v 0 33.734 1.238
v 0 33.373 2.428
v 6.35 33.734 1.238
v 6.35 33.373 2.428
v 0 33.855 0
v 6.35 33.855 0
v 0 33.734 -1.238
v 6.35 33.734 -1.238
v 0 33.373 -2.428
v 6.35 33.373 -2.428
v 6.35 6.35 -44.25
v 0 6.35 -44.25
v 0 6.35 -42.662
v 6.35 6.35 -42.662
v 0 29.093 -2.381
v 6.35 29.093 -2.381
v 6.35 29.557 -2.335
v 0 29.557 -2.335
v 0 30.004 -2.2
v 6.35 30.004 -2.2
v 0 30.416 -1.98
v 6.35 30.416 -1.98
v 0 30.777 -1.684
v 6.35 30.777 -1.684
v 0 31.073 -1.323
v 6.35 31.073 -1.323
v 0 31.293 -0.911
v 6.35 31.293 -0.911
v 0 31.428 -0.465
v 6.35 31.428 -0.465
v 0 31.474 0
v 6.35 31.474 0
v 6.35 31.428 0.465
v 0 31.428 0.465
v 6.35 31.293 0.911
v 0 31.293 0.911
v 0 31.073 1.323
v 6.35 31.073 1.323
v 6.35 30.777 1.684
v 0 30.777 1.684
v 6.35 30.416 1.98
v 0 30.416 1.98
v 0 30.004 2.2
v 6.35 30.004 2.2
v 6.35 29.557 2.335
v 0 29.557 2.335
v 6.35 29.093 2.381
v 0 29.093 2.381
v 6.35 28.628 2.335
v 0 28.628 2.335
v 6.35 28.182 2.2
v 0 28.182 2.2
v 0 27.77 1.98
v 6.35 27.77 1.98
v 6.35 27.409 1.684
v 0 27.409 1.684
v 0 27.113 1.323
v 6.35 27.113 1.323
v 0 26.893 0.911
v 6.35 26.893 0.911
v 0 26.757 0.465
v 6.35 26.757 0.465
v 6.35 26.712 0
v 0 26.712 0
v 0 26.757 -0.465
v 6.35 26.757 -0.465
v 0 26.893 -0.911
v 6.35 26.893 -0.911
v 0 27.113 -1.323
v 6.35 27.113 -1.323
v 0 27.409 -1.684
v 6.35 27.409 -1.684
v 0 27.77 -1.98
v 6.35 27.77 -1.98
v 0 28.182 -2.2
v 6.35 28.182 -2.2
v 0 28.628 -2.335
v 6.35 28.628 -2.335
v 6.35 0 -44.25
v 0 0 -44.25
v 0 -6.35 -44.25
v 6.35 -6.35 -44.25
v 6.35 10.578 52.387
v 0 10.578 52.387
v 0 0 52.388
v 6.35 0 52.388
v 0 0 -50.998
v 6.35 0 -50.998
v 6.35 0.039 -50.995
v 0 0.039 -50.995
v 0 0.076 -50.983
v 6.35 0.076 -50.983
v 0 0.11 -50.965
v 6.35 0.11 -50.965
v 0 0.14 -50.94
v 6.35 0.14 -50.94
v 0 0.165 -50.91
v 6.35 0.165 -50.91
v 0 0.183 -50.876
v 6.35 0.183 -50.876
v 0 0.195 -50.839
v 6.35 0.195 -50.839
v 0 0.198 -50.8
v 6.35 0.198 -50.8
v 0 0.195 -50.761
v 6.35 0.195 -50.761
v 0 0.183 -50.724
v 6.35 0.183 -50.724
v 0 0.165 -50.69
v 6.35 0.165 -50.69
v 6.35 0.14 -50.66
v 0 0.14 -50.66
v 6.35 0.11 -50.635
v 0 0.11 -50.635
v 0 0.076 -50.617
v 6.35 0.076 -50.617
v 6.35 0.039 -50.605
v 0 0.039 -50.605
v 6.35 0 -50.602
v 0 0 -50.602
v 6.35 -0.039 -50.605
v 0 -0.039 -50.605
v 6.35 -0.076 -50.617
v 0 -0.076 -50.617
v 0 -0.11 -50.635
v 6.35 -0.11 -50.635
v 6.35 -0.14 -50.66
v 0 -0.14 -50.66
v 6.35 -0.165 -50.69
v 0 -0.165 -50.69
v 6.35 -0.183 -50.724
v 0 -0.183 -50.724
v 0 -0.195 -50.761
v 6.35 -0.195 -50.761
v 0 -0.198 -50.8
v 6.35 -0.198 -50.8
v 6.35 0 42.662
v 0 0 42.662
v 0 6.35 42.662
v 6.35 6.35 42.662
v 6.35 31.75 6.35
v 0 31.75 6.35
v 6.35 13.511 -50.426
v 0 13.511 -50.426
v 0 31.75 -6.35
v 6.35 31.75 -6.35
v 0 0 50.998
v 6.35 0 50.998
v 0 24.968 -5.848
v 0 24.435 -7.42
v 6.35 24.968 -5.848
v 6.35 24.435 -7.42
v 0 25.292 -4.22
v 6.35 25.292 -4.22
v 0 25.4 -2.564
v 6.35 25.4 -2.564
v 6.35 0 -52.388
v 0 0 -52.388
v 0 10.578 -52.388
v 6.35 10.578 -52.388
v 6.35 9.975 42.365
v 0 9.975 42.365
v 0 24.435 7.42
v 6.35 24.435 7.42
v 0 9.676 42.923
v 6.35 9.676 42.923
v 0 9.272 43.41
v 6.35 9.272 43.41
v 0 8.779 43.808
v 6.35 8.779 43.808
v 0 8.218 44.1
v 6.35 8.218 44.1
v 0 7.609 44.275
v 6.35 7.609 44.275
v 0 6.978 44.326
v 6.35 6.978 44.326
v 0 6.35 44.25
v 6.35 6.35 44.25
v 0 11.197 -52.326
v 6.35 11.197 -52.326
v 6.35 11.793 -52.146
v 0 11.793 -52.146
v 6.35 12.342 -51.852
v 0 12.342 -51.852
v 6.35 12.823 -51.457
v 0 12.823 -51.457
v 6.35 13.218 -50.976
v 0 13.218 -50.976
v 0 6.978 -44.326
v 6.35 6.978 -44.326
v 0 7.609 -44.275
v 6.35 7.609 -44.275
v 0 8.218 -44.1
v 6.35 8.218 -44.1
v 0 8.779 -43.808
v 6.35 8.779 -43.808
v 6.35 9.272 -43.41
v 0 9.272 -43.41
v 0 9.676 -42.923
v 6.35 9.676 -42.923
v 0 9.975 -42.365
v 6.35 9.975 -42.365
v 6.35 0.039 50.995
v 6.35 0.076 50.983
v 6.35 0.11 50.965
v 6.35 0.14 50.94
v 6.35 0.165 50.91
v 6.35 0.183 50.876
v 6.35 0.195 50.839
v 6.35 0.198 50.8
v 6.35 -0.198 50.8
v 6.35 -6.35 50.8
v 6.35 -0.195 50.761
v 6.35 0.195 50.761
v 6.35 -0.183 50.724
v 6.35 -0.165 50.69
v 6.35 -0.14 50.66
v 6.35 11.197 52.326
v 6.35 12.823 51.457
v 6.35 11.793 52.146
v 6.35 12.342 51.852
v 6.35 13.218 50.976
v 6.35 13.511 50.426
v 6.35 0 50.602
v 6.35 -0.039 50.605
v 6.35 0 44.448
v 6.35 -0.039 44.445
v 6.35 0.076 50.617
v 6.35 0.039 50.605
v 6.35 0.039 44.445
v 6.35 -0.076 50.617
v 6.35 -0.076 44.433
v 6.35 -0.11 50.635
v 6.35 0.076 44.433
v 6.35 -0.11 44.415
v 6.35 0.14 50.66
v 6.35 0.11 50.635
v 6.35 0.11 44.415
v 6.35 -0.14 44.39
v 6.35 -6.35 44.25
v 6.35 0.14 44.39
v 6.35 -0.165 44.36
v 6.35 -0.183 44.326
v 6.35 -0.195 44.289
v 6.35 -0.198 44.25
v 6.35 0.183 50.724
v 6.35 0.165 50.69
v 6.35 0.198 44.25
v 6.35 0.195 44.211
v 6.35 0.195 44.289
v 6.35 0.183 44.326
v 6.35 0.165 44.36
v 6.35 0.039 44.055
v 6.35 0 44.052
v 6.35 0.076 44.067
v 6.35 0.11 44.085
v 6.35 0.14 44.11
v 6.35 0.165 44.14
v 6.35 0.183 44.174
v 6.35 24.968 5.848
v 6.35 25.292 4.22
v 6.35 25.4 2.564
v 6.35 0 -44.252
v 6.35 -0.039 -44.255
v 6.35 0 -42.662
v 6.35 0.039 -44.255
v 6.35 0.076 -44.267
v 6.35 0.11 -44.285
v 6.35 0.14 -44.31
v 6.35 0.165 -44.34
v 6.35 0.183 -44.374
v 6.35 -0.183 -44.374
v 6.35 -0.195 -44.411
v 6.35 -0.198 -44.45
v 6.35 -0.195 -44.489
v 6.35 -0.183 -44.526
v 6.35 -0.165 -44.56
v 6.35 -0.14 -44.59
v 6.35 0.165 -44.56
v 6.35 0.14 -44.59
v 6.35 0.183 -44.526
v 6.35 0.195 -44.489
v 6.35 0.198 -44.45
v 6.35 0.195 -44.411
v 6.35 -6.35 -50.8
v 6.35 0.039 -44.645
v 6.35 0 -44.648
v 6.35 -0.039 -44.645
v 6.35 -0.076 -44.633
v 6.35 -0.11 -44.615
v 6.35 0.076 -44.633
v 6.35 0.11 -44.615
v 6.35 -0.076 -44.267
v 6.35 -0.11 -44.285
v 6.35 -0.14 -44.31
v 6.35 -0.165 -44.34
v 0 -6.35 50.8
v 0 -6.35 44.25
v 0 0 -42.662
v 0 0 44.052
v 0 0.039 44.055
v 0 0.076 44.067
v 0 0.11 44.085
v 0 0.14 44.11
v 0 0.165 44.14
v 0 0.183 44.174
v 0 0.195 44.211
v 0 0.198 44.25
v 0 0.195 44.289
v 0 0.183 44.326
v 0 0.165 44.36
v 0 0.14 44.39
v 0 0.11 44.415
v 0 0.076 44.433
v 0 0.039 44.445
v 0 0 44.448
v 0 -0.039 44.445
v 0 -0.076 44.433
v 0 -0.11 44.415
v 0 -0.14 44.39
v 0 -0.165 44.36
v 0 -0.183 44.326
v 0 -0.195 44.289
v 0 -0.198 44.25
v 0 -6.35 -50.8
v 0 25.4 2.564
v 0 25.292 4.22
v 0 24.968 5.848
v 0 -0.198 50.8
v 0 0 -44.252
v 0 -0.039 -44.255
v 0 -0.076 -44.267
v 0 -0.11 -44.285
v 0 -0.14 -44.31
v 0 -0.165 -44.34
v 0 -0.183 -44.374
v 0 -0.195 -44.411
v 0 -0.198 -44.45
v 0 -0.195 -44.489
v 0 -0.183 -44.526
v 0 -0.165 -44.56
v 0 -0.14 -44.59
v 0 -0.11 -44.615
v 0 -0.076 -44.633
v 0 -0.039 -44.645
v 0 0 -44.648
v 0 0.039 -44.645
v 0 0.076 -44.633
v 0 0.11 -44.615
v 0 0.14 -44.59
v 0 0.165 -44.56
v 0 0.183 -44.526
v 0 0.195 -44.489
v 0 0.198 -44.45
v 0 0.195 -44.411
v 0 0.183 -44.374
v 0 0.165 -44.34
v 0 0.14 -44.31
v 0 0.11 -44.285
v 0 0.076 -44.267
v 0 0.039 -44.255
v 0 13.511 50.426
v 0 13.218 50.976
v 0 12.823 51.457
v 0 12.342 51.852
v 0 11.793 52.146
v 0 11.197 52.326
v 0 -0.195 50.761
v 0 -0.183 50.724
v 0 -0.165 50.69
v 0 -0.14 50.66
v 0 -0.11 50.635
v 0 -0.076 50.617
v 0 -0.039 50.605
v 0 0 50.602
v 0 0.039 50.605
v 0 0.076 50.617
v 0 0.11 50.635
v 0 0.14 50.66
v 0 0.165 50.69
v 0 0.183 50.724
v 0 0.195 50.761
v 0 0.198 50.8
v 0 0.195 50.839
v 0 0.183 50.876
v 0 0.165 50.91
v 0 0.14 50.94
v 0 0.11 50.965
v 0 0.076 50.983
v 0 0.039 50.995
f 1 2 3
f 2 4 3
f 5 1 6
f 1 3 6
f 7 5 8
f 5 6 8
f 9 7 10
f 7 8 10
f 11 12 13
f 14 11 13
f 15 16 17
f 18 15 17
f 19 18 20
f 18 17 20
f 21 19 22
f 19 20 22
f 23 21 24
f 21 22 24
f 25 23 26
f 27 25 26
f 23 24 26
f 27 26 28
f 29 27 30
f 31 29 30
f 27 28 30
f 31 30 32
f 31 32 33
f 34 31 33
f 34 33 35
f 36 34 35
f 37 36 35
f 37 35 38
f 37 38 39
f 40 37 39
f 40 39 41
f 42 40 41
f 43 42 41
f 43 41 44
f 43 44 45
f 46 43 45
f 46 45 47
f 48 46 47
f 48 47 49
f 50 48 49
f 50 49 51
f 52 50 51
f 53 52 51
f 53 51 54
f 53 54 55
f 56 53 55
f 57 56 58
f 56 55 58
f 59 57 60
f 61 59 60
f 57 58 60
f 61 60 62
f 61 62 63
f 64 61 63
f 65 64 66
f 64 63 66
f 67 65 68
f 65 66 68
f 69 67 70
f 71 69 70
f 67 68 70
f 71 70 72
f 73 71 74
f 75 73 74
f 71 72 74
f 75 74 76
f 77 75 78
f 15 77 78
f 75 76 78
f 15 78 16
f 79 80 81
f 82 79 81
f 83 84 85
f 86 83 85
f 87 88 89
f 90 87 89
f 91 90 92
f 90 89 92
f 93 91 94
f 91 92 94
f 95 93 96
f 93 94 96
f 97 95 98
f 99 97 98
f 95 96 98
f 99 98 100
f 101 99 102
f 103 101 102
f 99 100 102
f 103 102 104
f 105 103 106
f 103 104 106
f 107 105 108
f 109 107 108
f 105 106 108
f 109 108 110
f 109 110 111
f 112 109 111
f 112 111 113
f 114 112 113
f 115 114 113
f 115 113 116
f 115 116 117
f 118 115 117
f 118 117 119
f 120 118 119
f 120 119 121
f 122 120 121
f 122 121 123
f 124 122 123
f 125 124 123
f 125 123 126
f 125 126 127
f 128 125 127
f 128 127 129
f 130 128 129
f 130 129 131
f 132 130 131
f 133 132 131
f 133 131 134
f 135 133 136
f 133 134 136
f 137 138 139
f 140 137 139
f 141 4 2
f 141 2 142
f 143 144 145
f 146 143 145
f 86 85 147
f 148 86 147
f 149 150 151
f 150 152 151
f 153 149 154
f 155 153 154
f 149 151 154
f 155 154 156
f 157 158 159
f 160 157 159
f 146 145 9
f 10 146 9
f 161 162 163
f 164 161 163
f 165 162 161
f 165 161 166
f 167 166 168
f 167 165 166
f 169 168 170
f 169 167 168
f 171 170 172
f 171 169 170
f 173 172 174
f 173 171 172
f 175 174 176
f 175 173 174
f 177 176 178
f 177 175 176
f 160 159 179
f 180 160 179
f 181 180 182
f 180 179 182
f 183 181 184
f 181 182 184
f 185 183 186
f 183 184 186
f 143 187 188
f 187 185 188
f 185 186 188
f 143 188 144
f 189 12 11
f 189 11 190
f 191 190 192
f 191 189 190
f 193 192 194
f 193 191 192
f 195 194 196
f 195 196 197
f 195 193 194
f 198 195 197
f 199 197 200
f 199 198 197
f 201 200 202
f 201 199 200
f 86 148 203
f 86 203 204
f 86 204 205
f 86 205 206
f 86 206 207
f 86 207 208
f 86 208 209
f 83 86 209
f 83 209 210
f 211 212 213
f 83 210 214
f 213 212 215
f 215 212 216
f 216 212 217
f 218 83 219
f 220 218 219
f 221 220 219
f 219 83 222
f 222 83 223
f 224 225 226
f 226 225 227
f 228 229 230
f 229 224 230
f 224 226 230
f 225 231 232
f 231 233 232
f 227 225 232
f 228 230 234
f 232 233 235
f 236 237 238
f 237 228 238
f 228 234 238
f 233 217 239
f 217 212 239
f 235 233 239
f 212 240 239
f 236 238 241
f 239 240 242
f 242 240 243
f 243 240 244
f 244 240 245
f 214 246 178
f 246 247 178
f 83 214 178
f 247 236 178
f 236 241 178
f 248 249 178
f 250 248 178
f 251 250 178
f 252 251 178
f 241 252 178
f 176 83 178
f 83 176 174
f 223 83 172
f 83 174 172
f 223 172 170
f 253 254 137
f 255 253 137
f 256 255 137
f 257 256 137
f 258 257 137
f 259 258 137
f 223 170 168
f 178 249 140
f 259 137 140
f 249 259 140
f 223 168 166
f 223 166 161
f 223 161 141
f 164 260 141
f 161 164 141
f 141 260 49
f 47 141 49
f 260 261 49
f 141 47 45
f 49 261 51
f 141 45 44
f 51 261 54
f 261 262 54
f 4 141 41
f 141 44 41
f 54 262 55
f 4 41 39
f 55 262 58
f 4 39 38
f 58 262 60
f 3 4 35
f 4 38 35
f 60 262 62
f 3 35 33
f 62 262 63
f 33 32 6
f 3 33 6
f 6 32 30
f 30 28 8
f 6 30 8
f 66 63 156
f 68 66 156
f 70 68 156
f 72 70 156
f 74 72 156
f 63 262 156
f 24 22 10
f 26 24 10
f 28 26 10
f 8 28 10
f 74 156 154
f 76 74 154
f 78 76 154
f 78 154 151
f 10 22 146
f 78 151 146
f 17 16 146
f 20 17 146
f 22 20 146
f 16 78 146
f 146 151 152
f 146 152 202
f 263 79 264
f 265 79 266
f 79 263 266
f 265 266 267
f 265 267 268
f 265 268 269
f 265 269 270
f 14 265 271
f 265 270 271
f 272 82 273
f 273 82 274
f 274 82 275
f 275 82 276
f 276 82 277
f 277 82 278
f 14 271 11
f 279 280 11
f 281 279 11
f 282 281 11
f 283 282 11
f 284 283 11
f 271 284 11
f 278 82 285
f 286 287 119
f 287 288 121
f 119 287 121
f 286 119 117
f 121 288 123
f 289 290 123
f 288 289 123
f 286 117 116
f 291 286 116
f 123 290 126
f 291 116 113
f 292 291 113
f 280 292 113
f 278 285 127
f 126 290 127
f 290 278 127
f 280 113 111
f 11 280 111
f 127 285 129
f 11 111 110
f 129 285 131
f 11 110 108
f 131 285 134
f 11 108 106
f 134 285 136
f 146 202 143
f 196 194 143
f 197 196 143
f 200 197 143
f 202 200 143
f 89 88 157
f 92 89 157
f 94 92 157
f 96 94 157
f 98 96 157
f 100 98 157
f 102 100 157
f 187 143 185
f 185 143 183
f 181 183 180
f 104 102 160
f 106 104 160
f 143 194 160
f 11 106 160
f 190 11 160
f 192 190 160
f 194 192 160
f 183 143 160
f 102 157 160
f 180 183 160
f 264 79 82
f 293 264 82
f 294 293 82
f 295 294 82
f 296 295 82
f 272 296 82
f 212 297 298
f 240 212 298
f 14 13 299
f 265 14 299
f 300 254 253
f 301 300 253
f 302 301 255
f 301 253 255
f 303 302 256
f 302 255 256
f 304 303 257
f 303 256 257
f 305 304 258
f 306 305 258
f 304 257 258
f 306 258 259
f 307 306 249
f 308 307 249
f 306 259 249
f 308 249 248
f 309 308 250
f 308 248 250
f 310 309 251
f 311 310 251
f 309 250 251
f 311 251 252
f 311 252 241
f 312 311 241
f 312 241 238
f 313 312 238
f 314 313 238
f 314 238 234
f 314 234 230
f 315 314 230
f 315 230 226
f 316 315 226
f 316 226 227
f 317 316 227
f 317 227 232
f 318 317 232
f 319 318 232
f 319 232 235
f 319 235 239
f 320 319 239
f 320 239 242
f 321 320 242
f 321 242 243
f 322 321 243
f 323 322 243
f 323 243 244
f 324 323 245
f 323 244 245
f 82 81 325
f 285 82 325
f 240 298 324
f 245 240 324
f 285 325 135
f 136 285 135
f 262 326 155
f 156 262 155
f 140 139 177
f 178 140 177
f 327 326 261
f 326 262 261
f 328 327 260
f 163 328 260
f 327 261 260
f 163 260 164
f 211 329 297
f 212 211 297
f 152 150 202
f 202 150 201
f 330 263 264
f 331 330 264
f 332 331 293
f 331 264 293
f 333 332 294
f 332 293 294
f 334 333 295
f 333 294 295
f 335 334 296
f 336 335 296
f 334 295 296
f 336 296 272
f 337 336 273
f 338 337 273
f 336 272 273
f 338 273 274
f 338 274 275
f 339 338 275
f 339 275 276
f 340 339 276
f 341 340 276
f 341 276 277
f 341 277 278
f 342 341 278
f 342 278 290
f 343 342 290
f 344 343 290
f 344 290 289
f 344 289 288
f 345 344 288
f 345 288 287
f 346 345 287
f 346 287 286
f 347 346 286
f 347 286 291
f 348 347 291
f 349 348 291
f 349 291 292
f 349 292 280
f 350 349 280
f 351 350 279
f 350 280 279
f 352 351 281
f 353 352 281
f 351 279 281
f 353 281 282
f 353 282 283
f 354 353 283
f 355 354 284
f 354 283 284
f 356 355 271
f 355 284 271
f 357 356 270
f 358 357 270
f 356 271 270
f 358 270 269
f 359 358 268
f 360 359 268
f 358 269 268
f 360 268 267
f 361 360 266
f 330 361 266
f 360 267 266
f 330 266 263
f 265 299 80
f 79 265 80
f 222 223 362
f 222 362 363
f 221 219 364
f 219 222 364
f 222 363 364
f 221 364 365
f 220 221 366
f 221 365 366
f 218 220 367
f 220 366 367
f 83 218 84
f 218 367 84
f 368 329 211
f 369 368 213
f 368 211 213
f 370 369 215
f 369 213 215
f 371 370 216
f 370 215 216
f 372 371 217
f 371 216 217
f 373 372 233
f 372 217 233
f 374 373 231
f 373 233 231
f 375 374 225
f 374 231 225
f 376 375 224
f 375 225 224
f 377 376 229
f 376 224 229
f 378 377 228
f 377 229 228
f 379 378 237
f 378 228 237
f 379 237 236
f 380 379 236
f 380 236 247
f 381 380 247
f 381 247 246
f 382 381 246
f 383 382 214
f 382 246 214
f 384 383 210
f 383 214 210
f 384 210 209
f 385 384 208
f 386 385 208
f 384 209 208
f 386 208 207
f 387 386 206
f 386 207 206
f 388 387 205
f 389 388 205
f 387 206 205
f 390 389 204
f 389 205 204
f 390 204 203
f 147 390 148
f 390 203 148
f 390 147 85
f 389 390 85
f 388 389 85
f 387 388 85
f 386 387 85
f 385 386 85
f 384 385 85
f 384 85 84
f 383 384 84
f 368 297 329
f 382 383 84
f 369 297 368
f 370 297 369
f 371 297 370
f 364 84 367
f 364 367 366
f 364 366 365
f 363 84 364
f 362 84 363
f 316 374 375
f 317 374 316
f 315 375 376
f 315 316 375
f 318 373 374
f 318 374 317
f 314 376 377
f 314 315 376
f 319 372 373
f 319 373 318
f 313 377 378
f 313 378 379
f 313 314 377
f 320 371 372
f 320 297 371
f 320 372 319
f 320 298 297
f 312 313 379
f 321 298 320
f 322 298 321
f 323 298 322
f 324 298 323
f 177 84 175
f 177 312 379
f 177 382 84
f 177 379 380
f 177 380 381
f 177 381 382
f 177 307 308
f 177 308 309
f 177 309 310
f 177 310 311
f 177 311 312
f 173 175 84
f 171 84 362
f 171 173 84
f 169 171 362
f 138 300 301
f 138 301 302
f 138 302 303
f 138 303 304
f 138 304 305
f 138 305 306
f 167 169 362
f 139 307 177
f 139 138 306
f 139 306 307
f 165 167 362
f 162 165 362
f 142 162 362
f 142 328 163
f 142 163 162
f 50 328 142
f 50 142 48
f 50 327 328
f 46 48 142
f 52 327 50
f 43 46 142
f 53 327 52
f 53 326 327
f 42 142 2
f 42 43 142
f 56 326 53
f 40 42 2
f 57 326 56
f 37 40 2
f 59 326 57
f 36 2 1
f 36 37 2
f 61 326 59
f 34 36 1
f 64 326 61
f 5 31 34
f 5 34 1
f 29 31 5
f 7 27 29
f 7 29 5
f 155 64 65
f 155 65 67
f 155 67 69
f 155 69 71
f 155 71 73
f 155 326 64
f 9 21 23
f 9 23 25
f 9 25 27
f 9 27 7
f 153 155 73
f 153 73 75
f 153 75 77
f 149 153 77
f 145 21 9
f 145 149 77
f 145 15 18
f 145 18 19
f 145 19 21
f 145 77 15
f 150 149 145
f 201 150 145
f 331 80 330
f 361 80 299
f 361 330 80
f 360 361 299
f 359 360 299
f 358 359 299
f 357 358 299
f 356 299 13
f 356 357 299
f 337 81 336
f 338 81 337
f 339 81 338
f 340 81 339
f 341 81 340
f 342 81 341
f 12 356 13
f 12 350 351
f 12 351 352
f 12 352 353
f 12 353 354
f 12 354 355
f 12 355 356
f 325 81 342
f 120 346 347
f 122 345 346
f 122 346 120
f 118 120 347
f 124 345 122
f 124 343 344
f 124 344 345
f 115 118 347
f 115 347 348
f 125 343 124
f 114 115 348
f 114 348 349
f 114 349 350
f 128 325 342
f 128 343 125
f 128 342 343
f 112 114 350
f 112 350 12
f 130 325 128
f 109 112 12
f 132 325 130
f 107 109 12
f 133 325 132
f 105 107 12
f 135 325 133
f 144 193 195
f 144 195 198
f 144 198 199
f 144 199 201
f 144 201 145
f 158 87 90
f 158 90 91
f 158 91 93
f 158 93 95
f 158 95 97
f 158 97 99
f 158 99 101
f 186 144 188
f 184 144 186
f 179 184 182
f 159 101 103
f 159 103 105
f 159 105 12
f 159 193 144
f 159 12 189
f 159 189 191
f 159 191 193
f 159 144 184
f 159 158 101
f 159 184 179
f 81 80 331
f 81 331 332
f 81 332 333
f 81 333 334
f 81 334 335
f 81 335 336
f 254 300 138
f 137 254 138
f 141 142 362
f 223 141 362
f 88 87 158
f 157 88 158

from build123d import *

# Parameters (mm, degrees)
BOSS_EXTRUDE1_DEPTH = 6.35
SKETCH2_R           = 0.1984375
CUT_EXTRUDE1_DEPTH  = 63.980878762
FILLET5_R           = 3.175
FILLET6_R           = 12.7
FILLET7_R           = 6.35
SKETCH5_R           = 2.38125
CUT_EXTRUDE6_DEPTH  = 63.697383663


with BuildPart() as part:
    # Sketch1 → Boss-Extrude1 (new body)
    with BuildSketch(Plane(origin=(0, 0, 0), x_dir=(0, 0, -1), z_dir=(1, 0, 0))):
        Polygon((50.8, -6.35), (50.8, 0), (52.3875, 0), (52.3875, 12.7), (6.35, 31.75), (0, 34.377586207), (-6.35, 31.75), (-52.3875, 12.7), (-52.3875, 0), (-50.8, 0), (-50.8, -6.35), (-44.25, -6.35), (-44.25, 0), (-42.6625, 0), (-42.6625, 6.35), (-44.25, 6.35), (-46.0375, 8.455417024), (-5.088091142, 25.4), (5.088091142, 25.4), (46.0375, 8.455417024), (44.25, 6.35), (42.6625, 6.35), (42.6625, 0), (44.25, 0), (44.25, -6.35), align=None)
    extrude(amount=BOSS_EXTRUDE1_DEPTH)

    # Sketch2 → Cut-Extrude1 (cut, through all)
    with BuildSketch(Plane(origin=(6.35, 0, 0), x_dir=(0, 0, -1), z_dir=(1, 0, 0))):
        with Locations((-50.8, 0)):
            Circle(SKETCH2_R)
        with Locations((-44.25, 0)):
            Circle(SKETCH2_R)
        with Locations(Location((44.45, 0, 0), (0, 0, 180))):
            Circle(SKETCH2_R)
        with Locations((50.8, 0)):
            Circle(SKETCH2_R)
    extrude(amount=-CUT_EXTRUDE1_DEPTH, mode=Mode.SUBTRACT)

    # Fillet5
    # the kernel refuses this fillet: 3.175 mm, written as the material it adds along each edge
    with BuildSketch(Plane(origin=(0, 8.455417024, 46.0375), x_dir=(0, 0.38235179272629993, -0.9240168324218908), z_dir=(1, 0, 0))) as fillet5_piece_1:
        with BuildLine():
            CenterArc((3.974351986, -3.175), FILLET5_R, 90, 80.095777378)
            Line((0.846670114, -2.628894599), (0, 0))
            Line((0, 0), (3.974351986, 0))
        make_face()
    extrude(amount=6.35)
    with BuildSketch(Plane(origin=(0, 8.455417024, -46.0375), x_dir=(0, -0.7623151990147004, 0.6472059466284111), z_dir=(1, 0, 0))) as fillet5_piece_2:
        with BuildLine():
            CenterArc((4.240495318, -2.80967937), FILLET5_R, 117.756060194, 80.095777378)
            Line((1.218363855, -3.782996593), (0, 0))
            Line((0, 0), (2.761872027, 0))
        make_face()
    extrude(amount=6.35)
    # the kernel refuses this fillet: 3.175 mm, written as the material it takes off along each edge
    with BuildSketch(Plane(origin=(-5.30572872, 12.7, -52.3875), x_dir=(0, -1, 0), z_dir=(1, 0, 0)), Plane(origin=(-5.30572872, 12.7, 52.3875), x_dir=(0, 0.38235179272628034, -0.9240168324218988), z_dir=(1, 0, 0))) as fillet5_2_piece_1:
        with BuildLine():
            CenterArc((FILLET5_R * 0.668438263895, -FILLET5_R), FILLET5_R, 90, 67.520565603)
            Line((-FILLET5_R * 0.255578568527, -FILLET5_R * 0.617648207274), (0, 0))
            Line((0, 0), (FILLET5_R * 0.668438263895, 0))
        make_face()
    extrude(amount=16.961457439, mode=Mode.SUBTRACT)

    # Fillet6
    fillet6_edges = [part.edges().sort_by_distance(p)[0] for p in [
        (3.175, 25.4, -5.088091142),
        (3.175, 25.4, 5.088091142),
    ]]
    fillet(fillet6_edges, radius=FILLET6_R)

    # Fillet7
    fillet7_edges = [part.edges().sort_by_distance(p)[0] for p in [
        (3.175, 34.377586207, 0),
    ]]
    fillet(fillet7_edges, radius=FILLET7_R)

    # Sketch5 → Cut-Extrude6 (cut, through all)
    with BuildSketch(Plane(origin=(6.35, 0, 0), x_dir=(0, 0, -1), z_dir=(1, 0, 0))):
        with Locations((0, 29.092917024)):
            Circle(SKETCH5_R)
    extrude(amount=-CUT_EXTRUDE6_DEPTH, mode=Mode.SUBTRACT)


solid = part.part
